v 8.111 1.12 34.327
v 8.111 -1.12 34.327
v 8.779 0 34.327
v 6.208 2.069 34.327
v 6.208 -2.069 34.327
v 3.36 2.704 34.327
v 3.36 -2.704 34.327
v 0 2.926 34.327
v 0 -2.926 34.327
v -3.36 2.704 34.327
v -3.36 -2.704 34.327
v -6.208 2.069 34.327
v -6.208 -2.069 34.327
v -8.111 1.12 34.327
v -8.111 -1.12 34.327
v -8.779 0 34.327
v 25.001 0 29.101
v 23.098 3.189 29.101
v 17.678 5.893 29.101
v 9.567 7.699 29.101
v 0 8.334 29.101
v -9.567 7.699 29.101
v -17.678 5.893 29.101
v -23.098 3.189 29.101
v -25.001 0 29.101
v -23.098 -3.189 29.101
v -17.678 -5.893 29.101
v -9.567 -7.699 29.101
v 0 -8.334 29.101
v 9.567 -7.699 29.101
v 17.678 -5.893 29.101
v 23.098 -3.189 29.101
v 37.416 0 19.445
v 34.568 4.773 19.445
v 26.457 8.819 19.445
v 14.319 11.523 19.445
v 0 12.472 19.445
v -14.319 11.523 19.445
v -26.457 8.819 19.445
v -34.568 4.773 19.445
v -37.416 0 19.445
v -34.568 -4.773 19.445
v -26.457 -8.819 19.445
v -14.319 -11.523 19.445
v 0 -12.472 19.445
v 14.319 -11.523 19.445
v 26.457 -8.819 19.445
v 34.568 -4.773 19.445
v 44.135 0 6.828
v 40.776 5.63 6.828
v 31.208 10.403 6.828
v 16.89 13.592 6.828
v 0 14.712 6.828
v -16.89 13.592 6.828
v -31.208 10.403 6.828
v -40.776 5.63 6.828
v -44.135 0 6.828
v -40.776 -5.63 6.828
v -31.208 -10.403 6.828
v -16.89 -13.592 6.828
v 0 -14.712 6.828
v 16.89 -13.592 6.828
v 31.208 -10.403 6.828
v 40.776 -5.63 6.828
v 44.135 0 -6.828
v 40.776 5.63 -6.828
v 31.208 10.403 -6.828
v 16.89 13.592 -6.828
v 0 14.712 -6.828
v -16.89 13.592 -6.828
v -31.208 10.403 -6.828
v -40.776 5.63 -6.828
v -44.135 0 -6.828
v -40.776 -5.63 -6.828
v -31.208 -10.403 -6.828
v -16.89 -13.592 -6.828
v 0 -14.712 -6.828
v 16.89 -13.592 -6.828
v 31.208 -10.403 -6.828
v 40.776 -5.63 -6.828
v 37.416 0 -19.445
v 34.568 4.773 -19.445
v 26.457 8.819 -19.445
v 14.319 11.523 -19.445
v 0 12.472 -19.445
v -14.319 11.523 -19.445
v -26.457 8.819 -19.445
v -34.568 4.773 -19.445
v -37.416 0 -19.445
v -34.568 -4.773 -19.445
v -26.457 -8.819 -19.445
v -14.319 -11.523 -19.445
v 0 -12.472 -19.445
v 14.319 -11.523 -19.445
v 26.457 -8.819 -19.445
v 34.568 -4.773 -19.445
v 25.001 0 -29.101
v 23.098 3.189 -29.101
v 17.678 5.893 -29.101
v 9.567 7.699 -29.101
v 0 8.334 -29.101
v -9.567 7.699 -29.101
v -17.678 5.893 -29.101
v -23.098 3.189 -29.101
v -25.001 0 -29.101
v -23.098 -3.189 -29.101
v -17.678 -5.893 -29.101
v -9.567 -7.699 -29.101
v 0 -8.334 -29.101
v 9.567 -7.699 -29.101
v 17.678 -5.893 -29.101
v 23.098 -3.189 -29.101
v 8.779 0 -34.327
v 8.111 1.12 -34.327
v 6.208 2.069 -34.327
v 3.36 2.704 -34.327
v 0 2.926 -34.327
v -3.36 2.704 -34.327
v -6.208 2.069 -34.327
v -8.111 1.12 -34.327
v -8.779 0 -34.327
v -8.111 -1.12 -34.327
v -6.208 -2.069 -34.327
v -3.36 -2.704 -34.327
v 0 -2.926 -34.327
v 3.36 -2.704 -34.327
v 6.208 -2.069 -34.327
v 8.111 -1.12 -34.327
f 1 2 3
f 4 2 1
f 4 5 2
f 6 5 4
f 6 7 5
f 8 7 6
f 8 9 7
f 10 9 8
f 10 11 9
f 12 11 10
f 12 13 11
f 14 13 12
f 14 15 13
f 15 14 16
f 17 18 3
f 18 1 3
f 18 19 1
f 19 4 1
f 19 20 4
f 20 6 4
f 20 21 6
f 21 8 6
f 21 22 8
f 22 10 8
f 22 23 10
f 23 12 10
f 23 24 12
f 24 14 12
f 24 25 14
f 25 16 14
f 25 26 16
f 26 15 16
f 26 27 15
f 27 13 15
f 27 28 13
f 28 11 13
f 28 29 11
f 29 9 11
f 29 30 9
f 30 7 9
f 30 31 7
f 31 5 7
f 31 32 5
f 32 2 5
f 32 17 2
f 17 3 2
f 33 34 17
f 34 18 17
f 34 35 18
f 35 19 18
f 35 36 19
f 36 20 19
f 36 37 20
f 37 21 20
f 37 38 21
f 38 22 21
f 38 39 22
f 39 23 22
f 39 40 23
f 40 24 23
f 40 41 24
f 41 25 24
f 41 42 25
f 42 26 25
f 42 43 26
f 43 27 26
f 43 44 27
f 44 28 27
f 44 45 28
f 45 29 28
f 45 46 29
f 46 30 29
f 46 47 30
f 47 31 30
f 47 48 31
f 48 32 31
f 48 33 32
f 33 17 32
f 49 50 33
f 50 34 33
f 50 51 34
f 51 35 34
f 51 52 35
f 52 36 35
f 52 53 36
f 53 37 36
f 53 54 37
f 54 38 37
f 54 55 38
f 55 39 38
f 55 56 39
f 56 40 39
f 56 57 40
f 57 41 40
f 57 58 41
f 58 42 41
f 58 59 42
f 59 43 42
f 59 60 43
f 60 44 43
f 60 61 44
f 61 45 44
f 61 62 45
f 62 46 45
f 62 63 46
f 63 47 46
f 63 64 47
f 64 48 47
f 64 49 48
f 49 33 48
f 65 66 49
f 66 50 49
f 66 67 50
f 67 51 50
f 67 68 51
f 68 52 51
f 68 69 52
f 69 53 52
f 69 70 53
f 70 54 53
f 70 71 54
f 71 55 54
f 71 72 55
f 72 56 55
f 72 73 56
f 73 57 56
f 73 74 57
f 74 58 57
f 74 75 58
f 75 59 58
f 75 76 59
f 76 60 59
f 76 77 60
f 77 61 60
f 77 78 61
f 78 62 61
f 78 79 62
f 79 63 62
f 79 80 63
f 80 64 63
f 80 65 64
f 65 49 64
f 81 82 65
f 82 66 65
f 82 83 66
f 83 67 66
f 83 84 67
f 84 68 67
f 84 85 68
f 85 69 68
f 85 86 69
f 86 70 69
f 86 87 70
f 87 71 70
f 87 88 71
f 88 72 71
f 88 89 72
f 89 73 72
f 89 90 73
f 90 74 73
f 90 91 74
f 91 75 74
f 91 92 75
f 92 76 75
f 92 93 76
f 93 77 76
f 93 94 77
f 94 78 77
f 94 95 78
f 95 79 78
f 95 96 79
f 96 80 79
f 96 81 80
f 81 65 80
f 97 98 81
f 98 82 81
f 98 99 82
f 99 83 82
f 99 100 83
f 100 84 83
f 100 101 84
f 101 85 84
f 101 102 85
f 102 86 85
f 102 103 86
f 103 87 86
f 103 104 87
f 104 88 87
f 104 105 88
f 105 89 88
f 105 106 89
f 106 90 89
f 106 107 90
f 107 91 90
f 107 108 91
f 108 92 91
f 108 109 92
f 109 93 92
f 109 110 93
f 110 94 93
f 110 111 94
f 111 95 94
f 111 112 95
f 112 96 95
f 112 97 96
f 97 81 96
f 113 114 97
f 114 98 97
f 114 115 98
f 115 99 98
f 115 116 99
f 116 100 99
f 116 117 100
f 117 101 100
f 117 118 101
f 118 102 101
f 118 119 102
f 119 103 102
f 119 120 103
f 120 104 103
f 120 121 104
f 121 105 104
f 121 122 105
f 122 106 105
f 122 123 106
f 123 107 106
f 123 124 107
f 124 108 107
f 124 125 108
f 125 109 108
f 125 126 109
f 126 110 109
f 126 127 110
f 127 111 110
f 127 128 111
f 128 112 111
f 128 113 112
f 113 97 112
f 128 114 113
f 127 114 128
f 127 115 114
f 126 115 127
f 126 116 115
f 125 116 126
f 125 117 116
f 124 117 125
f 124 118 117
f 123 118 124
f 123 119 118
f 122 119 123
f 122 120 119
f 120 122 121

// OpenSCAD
// Generated by SolidPython 1.0.1 on 2020-07-29 00:46:48


scale(v = [9, 3, 7]) {
	sphere(r = 5);
}
/***********************************************
*********      SolidPython code:      **********
************************************************
 
# import packages: SolidPython
from solid import *
from solid.utils import *
from itertools import chain, combinations, permutations


class Resize:

    def __init__(self, scad_file):
        self.scad_file = scad_file
        #self.scad_file = import_scad(scad_file)
        # cone/cylinder param:
        self.r1 = 0
        self.r2 = 0
        self.h = 0
        # rectangular prism param:
        self.w = 0
        self.l = 0
        # ellipse param:
        self.r = 0

    # import OpenScad code (file name corresponds to shape)


    # classify shape + parameters
    def assign(self, param1, param2, param3):
        if self.scad_file == 'cone.scad':
            self.r1 = param1
            self.r2 = param2
            self.h = param3
        elif self.scad_file == 'cylinder.scad':
            self.r1 = param1
            self.r2 = param2
            self.h = param3
        elif self.scad_file == 'rectangularPrism.scad':
            self.h = param1
            self.l = param2
            self.w = param3
        else:
            self.r = param1
            self.h = param2

    # resize parameters
    def iterate(self):
        x = range(3, 20, 2)
        i = 1
        if self.scad_file == 'cone.scad':
            tempList = list(permutations(x, 2))
            for temp in tempList:
                param1 = temp[0]
                param2 = temp[1]
                filepath = 'produced_scad_files/' + 'cone' + str(param1) + '_' + str(param2) + '_' + '.scad'
                scad_render_to_file(cylinder(h=param1, r1=param2, r2=0), filepath)

        elif self.scad_file == 'cylinder.scad':
            tempList = list(permutations(x, 3))
            for temp in tempList:
                param1 = temp[0]
                param2 = temp[1]
                filepath = 'produced_scad_files/' + 'cylinder' + str(param1) + '_' + str(param2) + '_' + '.scad'
                scad_render_to_file(cylinder(h=param1, r1=param2, r2=param2), filepath)

        elif self.scad_file == 'rectangularPrism.scad':
            tempList = list(permutations(x, 3))
            for temp in tempList:
                param1 = temp[0]
                param2 = temp[1]
                param3 = temp[2]
                filepath = 'produced_scad_files/' + 'rectangularPrism' + str(param1) + '_' + str(param2) + '_' + str(
                    param3) + '.scad'
                scad_render_to_file(cube(size=(param1, param2, param3)), filepath)

        elif self.scad_file == 'ellipse.scad':
            tempList = list(permutations(x, 4))
            for temp in tempList:
                param1 = temp[0]
                param2 = temp[1]
                param3 = temp[2]
                param4 = temp[3]
                filepath = 'produced_scad_files/' + 'ellipse' + str(param1) + '_' + str(param2) + '_' + str(param3) + '_' + str(param4) + '.scad'
                scad_render_to_file(scale([param1, param2, param3])(sphere(r=param4)), filepath)

    def render_to_scadfile(self):
        scad_render_to_file(scad, 'example.scad') 
 
************************************************/
